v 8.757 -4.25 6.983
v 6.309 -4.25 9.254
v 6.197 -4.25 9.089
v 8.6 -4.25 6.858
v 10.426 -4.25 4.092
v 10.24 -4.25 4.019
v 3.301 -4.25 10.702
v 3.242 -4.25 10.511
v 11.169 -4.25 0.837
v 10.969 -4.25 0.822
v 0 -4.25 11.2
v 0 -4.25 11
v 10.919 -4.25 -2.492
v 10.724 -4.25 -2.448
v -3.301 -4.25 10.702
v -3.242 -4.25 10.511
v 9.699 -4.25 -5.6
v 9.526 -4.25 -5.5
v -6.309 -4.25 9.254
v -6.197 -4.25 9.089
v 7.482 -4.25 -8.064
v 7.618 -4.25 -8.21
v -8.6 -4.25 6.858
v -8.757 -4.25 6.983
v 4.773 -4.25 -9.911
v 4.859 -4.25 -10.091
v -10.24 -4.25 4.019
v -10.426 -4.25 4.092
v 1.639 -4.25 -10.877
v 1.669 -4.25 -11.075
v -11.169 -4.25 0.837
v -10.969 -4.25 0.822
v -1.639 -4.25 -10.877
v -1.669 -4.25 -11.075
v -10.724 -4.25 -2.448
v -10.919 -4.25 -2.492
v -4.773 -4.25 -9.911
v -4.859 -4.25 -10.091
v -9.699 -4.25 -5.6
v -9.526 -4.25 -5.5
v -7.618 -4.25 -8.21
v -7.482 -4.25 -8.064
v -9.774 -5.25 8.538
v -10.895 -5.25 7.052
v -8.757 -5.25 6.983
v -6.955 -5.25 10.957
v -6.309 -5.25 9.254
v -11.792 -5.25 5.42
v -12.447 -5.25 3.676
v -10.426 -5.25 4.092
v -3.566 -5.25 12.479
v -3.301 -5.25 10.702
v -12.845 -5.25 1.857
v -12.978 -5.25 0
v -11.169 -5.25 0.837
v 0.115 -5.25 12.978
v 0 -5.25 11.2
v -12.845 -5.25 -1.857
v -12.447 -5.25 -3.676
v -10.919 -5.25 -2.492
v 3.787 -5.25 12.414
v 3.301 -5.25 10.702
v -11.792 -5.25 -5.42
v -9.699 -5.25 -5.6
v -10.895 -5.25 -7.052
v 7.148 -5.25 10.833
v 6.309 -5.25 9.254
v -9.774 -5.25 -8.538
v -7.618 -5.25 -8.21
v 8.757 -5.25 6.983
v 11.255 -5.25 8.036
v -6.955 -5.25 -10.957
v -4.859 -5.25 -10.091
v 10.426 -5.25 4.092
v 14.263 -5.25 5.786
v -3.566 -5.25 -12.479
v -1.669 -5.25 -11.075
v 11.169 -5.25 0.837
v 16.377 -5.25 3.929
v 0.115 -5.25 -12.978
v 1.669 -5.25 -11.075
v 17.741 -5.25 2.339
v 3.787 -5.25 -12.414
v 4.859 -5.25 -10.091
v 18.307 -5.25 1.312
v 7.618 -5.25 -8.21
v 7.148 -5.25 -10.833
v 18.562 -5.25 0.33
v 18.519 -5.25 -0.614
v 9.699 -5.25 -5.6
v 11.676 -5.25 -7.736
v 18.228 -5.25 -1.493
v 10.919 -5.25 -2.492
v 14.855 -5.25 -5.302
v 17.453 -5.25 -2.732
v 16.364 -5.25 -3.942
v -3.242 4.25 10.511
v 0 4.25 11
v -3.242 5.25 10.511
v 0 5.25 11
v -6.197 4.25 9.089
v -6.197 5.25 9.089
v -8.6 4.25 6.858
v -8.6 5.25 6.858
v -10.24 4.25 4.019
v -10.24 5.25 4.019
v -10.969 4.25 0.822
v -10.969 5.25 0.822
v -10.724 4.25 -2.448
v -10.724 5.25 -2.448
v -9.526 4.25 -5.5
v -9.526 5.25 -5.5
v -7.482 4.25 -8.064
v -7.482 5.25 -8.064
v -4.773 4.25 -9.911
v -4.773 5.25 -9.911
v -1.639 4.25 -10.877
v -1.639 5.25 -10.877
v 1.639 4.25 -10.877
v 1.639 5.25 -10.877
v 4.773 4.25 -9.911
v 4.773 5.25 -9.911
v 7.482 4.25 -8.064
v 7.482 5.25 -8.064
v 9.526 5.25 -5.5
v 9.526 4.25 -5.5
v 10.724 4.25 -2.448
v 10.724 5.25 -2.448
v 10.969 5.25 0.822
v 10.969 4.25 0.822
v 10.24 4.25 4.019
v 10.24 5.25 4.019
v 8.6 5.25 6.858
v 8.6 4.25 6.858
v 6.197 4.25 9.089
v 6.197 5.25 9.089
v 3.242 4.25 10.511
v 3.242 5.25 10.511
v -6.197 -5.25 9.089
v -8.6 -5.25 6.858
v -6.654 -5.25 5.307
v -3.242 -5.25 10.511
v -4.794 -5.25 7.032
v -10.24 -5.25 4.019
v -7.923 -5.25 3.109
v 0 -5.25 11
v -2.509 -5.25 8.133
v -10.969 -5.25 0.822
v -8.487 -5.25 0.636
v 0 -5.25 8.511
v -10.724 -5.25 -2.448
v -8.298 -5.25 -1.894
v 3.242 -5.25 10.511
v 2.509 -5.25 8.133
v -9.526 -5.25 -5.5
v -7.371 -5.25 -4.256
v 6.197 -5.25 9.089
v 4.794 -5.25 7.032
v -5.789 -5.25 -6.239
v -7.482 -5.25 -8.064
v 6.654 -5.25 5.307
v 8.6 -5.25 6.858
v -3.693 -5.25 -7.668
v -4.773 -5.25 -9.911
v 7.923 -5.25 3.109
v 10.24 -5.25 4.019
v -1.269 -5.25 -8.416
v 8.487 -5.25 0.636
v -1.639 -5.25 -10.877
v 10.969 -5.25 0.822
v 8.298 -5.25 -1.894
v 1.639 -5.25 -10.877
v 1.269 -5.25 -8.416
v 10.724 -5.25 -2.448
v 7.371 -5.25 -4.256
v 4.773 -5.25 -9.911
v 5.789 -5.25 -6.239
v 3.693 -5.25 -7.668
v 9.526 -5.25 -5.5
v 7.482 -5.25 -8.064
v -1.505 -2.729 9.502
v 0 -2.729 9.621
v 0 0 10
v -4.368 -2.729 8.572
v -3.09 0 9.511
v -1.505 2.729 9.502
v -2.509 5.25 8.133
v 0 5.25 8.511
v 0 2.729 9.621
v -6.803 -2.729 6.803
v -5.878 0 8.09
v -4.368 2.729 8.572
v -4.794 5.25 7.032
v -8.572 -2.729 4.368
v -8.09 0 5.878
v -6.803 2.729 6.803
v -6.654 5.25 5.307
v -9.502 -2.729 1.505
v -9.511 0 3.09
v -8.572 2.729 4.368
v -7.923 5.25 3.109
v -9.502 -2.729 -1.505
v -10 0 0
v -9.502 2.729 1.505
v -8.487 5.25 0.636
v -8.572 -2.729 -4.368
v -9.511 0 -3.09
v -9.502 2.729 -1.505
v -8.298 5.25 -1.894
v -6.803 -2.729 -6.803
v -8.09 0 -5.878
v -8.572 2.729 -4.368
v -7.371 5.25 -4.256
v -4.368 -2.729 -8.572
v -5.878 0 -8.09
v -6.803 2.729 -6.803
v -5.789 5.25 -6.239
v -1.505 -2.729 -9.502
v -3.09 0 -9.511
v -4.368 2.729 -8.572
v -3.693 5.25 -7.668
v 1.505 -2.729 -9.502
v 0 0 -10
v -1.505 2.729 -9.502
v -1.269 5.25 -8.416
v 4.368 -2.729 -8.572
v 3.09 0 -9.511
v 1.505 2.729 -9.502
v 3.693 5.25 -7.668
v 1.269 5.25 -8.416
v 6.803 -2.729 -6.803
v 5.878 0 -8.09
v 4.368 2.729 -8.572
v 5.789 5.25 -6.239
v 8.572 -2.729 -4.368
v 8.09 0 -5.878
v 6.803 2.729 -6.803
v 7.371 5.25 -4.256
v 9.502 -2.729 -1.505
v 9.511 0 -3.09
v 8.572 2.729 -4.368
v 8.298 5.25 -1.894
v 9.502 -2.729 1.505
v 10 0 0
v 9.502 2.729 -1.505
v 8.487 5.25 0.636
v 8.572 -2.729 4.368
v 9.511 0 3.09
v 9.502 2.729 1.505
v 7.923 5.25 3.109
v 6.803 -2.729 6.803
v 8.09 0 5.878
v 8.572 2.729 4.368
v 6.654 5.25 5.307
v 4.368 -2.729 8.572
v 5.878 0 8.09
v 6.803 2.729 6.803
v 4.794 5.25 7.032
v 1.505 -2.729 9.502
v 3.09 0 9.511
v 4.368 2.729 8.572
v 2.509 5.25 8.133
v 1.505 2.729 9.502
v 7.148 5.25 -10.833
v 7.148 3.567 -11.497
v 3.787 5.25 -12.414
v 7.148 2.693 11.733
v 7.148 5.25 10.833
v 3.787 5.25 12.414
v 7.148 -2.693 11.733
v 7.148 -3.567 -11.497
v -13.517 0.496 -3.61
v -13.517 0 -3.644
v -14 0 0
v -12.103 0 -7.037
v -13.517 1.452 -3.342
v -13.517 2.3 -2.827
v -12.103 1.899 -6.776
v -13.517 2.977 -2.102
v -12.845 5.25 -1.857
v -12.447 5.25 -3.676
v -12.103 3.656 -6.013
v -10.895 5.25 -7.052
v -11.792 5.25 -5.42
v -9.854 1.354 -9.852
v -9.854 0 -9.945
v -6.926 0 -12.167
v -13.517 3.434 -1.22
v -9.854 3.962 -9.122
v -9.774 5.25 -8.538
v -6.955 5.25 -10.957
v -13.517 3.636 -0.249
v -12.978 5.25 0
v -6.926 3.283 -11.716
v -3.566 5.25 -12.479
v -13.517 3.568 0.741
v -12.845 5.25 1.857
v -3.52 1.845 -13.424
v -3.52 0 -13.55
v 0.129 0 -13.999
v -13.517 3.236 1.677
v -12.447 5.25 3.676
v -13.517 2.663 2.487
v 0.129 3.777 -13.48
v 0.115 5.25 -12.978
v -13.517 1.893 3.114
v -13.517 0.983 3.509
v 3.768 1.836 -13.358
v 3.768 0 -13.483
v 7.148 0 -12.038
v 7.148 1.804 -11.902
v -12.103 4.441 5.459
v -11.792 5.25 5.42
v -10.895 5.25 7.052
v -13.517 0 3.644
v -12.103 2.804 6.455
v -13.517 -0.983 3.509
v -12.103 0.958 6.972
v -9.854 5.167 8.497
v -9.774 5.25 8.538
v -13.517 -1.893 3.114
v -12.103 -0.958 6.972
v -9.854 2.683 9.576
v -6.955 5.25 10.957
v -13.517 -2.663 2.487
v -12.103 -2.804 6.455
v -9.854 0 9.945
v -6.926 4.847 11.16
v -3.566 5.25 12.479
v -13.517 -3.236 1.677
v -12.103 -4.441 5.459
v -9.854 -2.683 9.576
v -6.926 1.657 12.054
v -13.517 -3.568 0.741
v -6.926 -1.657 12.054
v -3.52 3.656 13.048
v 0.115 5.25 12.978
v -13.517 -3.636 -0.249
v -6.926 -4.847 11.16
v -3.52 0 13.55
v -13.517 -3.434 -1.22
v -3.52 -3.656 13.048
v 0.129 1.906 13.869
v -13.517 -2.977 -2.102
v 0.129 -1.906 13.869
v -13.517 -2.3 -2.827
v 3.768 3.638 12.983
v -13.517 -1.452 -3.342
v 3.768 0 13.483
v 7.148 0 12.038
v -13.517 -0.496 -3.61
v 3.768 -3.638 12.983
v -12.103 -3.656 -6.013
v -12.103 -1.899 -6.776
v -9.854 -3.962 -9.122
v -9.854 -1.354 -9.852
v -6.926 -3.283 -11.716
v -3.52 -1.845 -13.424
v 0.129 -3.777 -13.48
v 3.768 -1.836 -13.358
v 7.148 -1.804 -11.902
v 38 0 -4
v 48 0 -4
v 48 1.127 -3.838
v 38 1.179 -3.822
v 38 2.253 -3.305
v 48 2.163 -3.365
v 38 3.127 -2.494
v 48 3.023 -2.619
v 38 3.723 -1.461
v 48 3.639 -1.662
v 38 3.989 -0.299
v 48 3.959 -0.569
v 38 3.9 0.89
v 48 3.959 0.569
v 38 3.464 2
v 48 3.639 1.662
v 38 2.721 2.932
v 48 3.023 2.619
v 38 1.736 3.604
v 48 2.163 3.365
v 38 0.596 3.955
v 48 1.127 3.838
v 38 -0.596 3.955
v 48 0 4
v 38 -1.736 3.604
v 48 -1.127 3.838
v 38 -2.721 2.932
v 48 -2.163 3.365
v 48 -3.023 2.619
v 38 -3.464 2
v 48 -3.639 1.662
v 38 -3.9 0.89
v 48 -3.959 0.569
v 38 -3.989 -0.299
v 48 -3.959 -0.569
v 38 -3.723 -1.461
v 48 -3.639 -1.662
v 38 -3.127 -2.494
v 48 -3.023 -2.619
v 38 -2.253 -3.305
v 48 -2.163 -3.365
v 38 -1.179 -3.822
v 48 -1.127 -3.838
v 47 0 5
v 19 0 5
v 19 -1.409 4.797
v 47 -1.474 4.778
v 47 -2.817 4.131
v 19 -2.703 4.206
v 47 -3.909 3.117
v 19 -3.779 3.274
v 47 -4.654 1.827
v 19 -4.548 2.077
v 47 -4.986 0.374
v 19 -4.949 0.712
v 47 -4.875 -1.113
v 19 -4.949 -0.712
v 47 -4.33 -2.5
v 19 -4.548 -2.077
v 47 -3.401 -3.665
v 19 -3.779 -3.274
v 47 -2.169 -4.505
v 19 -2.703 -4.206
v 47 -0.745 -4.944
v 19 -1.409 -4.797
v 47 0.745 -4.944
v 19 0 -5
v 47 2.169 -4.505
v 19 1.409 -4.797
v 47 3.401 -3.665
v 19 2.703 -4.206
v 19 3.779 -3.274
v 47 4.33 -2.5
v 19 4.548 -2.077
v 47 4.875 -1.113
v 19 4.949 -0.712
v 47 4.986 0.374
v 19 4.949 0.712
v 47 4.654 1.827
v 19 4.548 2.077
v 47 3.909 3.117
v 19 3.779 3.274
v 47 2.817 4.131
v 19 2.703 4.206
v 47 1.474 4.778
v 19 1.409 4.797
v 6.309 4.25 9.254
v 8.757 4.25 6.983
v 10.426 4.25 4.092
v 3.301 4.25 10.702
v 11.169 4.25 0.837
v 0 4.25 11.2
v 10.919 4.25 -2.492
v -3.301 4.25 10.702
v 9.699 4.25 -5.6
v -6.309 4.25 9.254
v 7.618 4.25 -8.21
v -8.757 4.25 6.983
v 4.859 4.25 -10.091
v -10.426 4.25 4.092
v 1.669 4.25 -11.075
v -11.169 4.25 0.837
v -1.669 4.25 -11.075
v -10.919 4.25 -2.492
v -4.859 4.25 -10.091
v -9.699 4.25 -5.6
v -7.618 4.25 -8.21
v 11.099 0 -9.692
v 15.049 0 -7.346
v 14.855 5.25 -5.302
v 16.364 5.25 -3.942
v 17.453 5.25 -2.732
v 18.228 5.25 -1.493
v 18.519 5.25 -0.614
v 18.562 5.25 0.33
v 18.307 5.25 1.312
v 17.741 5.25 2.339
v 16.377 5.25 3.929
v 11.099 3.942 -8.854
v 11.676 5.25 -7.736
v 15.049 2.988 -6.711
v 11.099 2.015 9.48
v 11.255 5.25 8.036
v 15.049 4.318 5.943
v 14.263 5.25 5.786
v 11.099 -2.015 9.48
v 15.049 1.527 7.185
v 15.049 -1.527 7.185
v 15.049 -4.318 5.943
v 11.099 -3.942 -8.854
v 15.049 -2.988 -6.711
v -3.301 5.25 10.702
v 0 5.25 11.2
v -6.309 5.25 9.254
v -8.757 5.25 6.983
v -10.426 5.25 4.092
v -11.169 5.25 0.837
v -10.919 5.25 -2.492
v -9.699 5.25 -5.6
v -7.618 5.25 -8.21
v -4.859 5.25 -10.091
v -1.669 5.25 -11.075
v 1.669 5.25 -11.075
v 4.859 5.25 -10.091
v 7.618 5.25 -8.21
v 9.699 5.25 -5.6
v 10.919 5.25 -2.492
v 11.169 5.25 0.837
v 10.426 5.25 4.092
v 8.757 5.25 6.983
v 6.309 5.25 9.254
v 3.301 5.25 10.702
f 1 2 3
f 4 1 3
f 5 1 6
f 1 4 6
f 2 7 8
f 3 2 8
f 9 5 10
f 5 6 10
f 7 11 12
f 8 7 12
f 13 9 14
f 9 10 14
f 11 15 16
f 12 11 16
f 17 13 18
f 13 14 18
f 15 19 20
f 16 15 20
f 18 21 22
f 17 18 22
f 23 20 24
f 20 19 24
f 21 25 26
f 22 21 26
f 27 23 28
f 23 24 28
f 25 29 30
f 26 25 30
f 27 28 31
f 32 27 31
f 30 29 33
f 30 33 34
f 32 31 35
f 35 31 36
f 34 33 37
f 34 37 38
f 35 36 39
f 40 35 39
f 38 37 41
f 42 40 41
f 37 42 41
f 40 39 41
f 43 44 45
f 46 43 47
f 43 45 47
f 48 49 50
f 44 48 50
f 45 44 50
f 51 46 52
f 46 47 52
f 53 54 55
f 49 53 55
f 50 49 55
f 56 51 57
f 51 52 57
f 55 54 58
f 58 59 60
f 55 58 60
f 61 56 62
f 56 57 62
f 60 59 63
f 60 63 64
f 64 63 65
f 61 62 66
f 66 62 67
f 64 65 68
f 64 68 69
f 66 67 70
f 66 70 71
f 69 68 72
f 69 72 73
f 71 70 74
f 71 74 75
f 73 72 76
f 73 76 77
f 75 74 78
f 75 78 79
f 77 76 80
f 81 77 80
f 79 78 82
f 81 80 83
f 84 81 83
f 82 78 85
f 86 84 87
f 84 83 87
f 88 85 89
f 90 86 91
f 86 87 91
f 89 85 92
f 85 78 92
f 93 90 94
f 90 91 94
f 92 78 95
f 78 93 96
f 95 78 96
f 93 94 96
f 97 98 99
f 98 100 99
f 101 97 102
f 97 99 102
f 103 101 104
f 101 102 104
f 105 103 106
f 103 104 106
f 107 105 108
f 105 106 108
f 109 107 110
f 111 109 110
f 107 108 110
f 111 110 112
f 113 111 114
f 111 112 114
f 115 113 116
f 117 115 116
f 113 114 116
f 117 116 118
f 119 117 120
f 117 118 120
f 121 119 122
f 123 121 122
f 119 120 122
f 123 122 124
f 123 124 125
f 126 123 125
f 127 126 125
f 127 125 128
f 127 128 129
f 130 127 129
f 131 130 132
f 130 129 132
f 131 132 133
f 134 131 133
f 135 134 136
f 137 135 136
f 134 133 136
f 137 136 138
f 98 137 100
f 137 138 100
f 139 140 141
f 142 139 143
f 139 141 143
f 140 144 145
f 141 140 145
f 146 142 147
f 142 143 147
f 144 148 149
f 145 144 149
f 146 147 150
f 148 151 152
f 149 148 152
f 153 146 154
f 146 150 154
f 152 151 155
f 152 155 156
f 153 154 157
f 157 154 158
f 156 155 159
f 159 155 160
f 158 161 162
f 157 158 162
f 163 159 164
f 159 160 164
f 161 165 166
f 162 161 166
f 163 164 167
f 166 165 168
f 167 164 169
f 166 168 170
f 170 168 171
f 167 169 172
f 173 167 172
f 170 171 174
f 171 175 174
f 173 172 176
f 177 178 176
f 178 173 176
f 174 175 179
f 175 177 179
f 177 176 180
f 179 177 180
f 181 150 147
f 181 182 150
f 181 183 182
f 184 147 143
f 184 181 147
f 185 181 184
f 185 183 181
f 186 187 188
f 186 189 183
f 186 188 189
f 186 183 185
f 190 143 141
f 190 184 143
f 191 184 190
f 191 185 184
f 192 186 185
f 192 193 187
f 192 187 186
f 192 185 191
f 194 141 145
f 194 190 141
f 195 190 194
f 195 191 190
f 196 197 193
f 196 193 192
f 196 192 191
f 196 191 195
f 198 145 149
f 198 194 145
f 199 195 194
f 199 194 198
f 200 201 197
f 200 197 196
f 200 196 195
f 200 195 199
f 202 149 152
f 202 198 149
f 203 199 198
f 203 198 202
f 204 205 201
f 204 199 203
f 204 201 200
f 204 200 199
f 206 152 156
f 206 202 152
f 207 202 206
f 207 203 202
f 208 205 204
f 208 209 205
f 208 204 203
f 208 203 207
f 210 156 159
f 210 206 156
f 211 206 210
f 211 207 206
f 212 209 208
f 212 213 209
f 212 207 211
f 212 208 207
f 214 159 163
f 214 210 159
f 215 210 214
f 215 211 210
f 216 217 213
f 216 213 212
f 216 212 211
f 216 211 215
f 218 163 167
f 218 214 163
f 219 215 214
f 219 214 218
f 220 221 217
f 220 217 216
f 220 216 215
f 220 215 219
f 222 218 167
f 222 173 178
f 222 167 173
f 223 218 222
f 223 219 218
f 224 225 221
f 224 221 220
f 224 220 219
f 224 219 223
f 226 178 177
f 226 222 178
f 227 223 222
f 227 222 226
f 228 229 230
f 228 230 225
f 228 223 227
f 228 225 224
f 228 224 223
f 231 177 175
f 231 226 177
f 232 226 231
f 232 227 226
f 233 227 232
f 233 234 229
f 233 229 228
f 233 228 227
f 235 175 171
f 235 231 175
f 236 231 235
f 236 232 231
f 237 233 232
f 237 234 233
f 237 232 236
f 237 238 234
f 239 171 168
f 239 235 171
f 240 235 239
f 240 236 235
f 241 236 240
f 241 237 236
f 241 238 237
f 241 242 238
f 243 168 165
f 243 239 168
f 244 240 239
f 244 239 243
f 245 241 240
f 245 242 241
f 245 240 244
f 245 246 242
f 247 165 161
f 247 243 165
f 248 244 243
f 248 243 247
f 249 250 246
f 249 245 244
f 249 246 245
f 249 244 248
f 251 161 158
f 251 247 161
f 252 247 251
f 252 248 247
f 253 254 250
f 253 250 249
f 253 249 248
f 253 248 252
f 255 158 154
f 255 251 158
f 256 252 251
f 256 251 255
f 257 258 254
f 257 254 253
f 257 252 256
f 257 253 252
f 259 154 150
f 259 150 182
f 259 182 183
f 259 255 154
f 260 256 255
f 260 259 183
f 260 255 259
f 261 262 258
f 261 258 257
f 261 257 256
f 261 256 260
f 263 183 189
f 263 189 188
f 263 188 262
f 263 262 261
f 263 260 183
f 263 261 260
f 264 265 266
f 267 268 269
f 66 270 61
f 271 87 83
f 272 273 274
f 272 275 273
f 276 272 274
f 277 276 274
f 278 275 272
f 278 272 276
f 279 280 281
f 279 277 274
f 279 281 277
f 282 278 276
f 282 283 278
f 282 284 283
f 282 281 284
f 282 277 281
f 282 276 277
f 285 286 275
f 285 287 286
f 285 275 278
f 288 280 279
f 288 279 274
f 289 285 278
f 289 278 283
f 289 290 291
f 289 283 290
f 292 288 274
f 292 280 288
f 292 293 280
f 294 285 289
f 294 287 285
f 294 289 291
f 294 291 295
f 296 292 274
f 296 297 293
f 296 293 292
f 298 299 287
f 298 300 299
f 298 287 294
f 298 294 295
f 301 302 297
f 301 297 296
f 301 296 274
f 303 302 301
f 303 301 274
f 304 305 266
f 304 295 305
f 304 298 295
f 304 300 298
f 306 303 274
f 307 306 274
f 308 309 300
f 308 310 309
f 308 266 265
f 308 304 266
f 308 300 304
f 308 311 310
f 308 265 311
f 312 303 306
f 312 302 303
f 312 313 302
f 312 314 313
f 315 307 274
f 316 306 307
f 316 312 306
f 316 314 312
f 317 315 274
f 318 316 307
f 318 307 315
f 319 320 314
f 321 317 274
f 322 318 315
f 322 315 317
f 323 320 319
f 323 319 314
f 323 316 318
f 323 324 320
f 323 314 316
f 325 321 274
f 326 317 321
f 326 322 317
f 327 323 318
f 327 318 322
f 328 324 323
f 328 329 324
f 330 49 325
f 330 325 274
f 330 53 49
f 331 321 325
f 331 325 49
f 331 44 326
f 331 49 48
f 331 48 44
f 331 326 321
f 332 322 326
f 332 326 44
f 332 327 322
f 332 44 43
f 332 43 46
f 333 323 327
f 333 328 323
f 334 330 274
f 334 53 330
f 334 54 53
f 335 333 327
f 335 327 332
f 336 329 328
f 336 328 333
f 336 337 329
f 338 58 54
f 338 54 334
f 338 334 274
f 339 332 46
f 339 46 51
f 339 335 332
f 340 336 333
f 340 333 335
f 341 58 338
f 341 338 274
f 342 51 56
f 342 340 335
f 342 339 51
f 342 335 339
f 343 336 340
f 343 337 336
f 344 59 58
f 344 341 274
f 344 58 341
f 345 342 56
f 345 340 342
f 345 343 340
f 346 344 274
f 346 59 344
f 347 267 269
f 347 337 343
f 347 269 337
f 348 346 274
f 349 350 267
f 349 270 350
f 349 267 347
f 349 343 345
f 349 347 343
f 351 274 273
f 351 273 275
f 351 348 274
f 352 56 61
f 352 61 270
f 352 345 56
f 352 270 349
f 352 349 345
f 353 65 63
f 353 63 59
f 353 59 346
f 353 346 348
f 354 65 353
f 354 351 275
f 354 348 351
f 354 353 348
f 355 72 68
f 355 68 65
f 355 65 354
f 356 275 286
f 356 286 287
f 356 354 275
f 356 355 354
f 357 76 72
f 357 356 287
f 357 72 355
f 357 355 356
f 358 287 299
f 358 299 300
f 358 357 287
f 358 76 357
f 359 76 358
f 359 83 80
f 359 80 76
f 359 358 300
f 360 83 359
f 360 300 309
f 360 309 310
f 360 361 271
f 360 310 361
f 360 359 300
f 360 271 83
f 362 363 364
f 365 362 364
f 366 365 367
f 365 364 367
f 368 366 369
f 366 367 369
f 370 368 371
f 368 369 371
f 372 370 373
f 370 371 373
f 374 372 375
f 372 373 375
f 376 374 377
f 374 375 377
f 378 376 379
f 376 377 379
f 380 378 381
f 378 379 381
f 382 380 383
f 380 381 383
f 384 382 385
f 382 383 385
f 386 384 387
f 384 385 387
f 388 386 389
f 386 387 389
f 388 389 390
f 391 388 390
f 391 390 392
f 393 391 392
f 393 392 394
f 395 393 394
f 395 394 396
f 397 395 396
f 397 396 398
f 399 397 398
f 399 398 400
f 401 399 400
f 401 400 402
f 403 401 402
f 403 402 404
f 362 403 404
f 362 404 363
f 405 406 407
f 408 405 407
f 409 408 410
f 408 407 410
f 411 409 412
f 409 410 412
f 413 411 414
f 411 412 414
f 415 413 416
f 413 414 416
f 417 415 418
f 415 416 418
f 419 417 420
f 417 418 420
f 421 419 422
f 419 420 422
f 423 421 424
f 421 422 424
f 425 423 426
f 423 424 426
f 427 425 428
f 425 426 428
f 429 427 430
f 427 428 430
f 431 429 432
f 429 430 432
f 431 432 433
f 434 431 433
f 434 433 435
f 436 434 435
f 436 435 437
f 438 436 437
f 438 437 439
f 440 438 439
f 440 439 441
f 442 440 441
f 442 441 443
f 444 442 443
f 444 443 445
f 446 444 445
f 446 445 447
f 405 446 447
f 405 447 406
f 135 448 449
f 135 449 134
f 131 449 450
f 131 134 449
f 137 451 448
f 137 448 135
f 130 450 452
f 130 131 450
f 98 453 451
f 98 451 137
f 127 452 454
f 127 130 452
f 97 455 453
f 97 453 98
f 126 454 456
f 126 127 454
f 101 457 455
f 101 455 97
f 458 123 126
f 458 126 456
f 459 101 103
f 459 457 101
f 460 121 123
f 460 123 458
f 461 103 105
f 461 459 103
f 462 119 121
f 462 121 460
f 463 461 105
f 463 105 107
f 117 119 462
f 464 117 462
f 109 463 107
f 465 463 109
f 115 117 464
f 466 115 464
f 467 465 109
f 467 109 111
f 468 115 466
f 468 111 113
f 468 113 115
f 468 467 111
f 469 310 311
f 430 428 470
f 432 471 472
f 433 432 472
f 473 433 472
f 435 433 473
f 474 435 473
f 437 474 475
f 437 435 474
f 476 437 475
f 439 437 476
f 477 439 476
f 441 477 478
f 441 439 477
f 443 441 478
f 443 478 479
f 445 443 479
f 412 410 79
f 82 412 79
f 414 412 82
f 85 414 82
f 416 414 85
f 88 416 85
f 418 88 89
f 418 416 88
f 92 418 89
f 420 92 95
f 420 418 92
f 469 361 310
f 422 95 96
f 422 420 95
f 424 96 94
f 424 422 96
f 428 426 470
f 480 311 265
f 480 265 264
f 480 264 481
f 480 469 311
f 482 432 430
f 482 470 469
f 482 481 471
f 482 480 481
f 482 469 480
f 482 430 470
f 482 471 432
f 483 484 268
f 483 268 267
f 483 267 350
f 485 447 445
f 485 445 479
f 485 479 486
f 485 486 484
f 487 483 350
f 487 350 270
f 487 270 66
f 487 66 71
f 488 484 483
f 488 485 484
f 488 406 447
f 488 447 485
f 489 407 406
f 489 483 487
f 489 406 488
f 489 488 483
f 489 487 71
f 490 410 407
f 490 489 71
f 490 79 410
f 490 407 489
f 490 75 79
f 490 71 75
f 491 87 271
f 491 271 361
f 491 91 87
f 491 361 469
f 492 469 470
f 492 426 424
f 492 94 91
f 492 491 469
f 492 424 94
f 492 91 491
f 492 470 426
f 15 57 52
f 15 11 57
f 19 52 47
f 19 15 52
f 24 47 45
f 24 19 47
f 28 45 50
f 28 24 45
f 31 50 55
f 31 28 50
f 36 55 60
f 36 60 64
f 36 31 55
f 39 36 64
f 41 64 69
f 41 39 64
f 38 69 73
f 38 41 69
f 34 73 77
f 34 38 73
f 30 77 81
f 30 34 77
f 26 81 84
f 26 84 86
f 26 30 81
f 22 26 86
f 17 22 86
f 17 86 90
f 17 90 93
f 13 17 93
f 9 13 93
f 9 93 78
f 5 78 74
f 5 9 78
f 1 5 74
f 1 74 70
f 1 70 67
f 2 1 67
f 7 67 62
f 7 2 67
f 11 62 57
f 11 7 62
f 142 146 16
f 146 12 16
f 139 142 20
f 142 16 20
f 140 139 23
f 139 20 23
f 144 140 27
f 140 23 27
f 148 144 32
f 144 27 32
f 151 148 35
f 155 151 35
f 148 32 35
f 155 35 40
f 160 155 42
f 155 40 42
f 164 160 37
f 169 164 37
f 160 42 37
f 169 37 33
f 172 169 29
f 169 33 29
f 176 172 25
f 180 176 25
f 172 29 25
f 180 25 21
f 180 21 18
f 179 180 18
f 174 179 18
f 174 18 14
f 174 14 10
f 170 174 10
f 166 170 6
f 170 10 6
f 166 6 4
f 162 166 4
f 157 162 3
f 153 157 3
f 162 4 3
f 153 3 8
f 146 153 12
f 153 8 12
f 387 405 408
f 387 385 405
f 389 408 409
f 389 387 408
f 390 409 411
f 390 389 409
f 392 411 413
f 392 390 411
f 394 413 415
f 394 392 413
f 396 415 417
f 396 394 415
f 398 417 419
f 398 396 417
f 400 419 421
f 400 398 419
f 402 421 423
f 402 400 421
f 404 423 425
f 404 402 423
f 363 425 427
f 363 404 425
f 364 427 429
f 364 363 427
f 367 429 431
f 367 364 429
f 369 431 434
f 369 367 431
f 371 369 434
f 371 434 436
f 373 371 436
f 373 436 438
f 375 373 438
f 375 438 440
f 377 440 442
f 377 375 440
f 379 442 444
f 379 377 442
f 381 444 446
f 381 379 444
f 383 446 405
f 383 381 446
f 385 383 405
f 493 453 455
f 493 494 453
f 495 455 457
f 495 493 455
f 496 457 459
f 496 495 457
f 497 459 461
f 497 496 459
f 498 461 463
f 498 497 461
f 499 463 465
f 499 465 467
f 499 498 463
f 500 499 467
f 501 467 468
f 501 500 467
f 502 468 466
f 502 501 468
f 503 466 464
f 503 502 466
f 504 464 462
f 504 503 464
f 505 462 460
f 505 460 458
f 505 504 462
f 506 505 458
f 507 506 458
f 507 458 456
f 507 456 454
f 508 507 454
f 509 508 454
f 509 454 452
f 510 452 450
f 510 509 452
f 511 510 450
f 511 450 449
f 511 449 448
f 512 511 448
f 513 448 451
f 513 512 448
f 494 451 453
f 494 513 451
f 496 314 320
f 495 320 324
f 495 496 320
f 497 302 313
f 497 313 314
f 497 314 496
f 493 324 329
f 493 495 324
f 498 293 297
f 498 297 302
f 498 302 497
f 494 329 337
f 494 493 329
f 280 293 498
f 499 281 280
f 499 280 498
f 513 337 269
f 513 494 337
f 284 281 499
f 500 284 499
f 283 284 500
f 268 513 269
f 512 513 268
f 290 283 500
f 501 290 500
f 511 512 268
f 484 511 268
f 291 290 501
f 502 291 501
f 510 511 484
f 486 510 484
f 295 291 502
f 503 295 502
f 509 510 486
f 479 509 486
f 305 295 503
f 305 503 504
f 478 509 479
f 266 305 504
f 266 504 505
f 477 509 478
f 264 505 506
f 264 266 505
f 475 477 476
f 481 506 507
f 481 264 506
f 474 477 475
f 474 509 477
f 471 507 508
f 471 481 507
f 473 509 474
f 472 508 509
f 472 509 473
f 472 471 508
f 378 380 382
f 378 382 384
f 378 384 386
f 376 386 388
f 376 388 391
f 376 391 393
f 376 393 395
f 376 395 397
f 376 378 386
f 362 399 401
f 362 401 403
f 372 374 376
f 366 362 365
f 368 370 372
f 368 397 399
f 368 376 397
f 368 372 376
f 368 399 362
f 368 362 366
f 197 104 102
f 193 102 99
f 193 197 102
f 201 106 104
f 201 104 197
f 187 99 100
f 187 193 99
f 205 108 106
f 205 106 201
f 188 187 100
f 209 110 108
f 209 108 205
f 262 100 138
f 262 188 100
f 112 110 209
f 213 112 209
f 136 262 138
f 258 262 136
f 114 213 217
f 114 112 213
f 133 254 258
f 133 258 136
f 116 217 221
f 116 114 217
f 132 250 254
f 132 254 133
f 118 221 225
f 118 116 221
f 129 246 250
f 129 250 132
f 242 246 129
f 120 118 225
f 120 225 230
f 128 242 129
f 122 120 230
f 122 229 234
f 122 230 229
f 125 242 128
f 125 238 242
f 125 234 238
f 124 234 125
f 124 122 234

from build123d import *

# Parameters (mm, degrees)
CUT_EXTRUDE1_DEPTH      = 28.440845468
CUT_EXTRUDE1_DEPTH_BACK = 28.440845468
SKETCH3_W               = 33
SKETCH3_H               = 8.75
SKETCH4_W               = 0.2
SKETCH4_H               = 1
SKETCH5_R               = 5
BOSS_EXTRUDE1_DEPTH     = 29
CHAMFER1_SIZE           = 1
ESQUISSE1_R             = 4
ENL_V_MAT_EXTRU_1_DEPTH = 10


with BuildPart() as part:
    # Sketch2 → Revolve2 (revolve)
    with BuildSketch(Plane(origin=(0, 0, 0), x_dir=(1, 0, 0), z_dir=(0, 1, 0))):
        with BuildLine():
            Line((7.147970434, 12.037712352), (19, 5))
            Line((19, 5), (19, 0))
            Line((19, 0), (-14, 0))
            ThreePointArc((-14, 0), (-6.925619609, 12.166996056), (7.147970434, 12.037712352))
        make_face()
    revolve(axis=Axis((-39.456415939, 0, 0), (1, 0, 0)))

    # Sketch3 → Cut-Extrude1 (cut, two sides: drawn at the far end of the back side and taken through both)
    with BuildSketch(Plane.XY.offset(-CUT_EXTRUDE1_DEPTH_BACK)):
        with Locations((2.5, 9.625)):
            Rectangle(SKETCH3_W, SKETCH3_H)
        with Locations((2.5, -9.625)):
            Rectangle(SKETCH3_W, SKETCH3_H)
    extrude(amount=CUT_EXTRUDE1_DEPTH + CUT_EXTRUDE1_DEPTH_BACK, mode=Mode.SUBTRACT)

    # Sketch4 → Cut-Revolve1 (revolve, cut)
    with BuildSketch(Plane.XY):
        with BuildLine():
            Line((0, 10), (0, -10))
            ThreePointArc((0, -10), (10, 0), (0, 10))
        make_face()
        with Locations((11.1, 4.75)):
            Rectangle(SKETCH4_W, SKETCH4_H)
        with Locations((11.1, -4.75)):
            Rectangle(SKETCH4_W, SKETCH4_H)
    revolve(axis=Axis((0, 13.975998128, 0), (0, -1, 0)), mode=Mode.SUBTRACT)

    # Sketch5 → Boss-Extrude1 (add)
    with BuildSketch(Plane(origin=(19, 0, 0), x_dir=(0, 0, -1), z_dir=(1, 0, 0))):
        Circle(SKETCH5_R)
    extrude(amount=BOSS_EXTRUDE1_DEPTH)

    # Chamfer1
    chamfer1_edges = [part.edges().sort_by_distance(p)[0] for p in [
        (48, 0, 5),
    ]]
    chamfer(chamfer1_edges, length=CHAMFER1_SIZE)

    # Esquisse1 → Enlèv. mat.-Extru.1 (cut)
    with BuildSketch(Plane(origin=(48, 0, 0), x_dir=(0, 0, -1), z_dir=(1, 0, 0))):
        Circle(ESQUISSE1_R)
    extrude(amount=-ENL_V_MAT_EXTRU_1_DEPTH, mode=Mode.SUBTRACT)


solid = part.part
